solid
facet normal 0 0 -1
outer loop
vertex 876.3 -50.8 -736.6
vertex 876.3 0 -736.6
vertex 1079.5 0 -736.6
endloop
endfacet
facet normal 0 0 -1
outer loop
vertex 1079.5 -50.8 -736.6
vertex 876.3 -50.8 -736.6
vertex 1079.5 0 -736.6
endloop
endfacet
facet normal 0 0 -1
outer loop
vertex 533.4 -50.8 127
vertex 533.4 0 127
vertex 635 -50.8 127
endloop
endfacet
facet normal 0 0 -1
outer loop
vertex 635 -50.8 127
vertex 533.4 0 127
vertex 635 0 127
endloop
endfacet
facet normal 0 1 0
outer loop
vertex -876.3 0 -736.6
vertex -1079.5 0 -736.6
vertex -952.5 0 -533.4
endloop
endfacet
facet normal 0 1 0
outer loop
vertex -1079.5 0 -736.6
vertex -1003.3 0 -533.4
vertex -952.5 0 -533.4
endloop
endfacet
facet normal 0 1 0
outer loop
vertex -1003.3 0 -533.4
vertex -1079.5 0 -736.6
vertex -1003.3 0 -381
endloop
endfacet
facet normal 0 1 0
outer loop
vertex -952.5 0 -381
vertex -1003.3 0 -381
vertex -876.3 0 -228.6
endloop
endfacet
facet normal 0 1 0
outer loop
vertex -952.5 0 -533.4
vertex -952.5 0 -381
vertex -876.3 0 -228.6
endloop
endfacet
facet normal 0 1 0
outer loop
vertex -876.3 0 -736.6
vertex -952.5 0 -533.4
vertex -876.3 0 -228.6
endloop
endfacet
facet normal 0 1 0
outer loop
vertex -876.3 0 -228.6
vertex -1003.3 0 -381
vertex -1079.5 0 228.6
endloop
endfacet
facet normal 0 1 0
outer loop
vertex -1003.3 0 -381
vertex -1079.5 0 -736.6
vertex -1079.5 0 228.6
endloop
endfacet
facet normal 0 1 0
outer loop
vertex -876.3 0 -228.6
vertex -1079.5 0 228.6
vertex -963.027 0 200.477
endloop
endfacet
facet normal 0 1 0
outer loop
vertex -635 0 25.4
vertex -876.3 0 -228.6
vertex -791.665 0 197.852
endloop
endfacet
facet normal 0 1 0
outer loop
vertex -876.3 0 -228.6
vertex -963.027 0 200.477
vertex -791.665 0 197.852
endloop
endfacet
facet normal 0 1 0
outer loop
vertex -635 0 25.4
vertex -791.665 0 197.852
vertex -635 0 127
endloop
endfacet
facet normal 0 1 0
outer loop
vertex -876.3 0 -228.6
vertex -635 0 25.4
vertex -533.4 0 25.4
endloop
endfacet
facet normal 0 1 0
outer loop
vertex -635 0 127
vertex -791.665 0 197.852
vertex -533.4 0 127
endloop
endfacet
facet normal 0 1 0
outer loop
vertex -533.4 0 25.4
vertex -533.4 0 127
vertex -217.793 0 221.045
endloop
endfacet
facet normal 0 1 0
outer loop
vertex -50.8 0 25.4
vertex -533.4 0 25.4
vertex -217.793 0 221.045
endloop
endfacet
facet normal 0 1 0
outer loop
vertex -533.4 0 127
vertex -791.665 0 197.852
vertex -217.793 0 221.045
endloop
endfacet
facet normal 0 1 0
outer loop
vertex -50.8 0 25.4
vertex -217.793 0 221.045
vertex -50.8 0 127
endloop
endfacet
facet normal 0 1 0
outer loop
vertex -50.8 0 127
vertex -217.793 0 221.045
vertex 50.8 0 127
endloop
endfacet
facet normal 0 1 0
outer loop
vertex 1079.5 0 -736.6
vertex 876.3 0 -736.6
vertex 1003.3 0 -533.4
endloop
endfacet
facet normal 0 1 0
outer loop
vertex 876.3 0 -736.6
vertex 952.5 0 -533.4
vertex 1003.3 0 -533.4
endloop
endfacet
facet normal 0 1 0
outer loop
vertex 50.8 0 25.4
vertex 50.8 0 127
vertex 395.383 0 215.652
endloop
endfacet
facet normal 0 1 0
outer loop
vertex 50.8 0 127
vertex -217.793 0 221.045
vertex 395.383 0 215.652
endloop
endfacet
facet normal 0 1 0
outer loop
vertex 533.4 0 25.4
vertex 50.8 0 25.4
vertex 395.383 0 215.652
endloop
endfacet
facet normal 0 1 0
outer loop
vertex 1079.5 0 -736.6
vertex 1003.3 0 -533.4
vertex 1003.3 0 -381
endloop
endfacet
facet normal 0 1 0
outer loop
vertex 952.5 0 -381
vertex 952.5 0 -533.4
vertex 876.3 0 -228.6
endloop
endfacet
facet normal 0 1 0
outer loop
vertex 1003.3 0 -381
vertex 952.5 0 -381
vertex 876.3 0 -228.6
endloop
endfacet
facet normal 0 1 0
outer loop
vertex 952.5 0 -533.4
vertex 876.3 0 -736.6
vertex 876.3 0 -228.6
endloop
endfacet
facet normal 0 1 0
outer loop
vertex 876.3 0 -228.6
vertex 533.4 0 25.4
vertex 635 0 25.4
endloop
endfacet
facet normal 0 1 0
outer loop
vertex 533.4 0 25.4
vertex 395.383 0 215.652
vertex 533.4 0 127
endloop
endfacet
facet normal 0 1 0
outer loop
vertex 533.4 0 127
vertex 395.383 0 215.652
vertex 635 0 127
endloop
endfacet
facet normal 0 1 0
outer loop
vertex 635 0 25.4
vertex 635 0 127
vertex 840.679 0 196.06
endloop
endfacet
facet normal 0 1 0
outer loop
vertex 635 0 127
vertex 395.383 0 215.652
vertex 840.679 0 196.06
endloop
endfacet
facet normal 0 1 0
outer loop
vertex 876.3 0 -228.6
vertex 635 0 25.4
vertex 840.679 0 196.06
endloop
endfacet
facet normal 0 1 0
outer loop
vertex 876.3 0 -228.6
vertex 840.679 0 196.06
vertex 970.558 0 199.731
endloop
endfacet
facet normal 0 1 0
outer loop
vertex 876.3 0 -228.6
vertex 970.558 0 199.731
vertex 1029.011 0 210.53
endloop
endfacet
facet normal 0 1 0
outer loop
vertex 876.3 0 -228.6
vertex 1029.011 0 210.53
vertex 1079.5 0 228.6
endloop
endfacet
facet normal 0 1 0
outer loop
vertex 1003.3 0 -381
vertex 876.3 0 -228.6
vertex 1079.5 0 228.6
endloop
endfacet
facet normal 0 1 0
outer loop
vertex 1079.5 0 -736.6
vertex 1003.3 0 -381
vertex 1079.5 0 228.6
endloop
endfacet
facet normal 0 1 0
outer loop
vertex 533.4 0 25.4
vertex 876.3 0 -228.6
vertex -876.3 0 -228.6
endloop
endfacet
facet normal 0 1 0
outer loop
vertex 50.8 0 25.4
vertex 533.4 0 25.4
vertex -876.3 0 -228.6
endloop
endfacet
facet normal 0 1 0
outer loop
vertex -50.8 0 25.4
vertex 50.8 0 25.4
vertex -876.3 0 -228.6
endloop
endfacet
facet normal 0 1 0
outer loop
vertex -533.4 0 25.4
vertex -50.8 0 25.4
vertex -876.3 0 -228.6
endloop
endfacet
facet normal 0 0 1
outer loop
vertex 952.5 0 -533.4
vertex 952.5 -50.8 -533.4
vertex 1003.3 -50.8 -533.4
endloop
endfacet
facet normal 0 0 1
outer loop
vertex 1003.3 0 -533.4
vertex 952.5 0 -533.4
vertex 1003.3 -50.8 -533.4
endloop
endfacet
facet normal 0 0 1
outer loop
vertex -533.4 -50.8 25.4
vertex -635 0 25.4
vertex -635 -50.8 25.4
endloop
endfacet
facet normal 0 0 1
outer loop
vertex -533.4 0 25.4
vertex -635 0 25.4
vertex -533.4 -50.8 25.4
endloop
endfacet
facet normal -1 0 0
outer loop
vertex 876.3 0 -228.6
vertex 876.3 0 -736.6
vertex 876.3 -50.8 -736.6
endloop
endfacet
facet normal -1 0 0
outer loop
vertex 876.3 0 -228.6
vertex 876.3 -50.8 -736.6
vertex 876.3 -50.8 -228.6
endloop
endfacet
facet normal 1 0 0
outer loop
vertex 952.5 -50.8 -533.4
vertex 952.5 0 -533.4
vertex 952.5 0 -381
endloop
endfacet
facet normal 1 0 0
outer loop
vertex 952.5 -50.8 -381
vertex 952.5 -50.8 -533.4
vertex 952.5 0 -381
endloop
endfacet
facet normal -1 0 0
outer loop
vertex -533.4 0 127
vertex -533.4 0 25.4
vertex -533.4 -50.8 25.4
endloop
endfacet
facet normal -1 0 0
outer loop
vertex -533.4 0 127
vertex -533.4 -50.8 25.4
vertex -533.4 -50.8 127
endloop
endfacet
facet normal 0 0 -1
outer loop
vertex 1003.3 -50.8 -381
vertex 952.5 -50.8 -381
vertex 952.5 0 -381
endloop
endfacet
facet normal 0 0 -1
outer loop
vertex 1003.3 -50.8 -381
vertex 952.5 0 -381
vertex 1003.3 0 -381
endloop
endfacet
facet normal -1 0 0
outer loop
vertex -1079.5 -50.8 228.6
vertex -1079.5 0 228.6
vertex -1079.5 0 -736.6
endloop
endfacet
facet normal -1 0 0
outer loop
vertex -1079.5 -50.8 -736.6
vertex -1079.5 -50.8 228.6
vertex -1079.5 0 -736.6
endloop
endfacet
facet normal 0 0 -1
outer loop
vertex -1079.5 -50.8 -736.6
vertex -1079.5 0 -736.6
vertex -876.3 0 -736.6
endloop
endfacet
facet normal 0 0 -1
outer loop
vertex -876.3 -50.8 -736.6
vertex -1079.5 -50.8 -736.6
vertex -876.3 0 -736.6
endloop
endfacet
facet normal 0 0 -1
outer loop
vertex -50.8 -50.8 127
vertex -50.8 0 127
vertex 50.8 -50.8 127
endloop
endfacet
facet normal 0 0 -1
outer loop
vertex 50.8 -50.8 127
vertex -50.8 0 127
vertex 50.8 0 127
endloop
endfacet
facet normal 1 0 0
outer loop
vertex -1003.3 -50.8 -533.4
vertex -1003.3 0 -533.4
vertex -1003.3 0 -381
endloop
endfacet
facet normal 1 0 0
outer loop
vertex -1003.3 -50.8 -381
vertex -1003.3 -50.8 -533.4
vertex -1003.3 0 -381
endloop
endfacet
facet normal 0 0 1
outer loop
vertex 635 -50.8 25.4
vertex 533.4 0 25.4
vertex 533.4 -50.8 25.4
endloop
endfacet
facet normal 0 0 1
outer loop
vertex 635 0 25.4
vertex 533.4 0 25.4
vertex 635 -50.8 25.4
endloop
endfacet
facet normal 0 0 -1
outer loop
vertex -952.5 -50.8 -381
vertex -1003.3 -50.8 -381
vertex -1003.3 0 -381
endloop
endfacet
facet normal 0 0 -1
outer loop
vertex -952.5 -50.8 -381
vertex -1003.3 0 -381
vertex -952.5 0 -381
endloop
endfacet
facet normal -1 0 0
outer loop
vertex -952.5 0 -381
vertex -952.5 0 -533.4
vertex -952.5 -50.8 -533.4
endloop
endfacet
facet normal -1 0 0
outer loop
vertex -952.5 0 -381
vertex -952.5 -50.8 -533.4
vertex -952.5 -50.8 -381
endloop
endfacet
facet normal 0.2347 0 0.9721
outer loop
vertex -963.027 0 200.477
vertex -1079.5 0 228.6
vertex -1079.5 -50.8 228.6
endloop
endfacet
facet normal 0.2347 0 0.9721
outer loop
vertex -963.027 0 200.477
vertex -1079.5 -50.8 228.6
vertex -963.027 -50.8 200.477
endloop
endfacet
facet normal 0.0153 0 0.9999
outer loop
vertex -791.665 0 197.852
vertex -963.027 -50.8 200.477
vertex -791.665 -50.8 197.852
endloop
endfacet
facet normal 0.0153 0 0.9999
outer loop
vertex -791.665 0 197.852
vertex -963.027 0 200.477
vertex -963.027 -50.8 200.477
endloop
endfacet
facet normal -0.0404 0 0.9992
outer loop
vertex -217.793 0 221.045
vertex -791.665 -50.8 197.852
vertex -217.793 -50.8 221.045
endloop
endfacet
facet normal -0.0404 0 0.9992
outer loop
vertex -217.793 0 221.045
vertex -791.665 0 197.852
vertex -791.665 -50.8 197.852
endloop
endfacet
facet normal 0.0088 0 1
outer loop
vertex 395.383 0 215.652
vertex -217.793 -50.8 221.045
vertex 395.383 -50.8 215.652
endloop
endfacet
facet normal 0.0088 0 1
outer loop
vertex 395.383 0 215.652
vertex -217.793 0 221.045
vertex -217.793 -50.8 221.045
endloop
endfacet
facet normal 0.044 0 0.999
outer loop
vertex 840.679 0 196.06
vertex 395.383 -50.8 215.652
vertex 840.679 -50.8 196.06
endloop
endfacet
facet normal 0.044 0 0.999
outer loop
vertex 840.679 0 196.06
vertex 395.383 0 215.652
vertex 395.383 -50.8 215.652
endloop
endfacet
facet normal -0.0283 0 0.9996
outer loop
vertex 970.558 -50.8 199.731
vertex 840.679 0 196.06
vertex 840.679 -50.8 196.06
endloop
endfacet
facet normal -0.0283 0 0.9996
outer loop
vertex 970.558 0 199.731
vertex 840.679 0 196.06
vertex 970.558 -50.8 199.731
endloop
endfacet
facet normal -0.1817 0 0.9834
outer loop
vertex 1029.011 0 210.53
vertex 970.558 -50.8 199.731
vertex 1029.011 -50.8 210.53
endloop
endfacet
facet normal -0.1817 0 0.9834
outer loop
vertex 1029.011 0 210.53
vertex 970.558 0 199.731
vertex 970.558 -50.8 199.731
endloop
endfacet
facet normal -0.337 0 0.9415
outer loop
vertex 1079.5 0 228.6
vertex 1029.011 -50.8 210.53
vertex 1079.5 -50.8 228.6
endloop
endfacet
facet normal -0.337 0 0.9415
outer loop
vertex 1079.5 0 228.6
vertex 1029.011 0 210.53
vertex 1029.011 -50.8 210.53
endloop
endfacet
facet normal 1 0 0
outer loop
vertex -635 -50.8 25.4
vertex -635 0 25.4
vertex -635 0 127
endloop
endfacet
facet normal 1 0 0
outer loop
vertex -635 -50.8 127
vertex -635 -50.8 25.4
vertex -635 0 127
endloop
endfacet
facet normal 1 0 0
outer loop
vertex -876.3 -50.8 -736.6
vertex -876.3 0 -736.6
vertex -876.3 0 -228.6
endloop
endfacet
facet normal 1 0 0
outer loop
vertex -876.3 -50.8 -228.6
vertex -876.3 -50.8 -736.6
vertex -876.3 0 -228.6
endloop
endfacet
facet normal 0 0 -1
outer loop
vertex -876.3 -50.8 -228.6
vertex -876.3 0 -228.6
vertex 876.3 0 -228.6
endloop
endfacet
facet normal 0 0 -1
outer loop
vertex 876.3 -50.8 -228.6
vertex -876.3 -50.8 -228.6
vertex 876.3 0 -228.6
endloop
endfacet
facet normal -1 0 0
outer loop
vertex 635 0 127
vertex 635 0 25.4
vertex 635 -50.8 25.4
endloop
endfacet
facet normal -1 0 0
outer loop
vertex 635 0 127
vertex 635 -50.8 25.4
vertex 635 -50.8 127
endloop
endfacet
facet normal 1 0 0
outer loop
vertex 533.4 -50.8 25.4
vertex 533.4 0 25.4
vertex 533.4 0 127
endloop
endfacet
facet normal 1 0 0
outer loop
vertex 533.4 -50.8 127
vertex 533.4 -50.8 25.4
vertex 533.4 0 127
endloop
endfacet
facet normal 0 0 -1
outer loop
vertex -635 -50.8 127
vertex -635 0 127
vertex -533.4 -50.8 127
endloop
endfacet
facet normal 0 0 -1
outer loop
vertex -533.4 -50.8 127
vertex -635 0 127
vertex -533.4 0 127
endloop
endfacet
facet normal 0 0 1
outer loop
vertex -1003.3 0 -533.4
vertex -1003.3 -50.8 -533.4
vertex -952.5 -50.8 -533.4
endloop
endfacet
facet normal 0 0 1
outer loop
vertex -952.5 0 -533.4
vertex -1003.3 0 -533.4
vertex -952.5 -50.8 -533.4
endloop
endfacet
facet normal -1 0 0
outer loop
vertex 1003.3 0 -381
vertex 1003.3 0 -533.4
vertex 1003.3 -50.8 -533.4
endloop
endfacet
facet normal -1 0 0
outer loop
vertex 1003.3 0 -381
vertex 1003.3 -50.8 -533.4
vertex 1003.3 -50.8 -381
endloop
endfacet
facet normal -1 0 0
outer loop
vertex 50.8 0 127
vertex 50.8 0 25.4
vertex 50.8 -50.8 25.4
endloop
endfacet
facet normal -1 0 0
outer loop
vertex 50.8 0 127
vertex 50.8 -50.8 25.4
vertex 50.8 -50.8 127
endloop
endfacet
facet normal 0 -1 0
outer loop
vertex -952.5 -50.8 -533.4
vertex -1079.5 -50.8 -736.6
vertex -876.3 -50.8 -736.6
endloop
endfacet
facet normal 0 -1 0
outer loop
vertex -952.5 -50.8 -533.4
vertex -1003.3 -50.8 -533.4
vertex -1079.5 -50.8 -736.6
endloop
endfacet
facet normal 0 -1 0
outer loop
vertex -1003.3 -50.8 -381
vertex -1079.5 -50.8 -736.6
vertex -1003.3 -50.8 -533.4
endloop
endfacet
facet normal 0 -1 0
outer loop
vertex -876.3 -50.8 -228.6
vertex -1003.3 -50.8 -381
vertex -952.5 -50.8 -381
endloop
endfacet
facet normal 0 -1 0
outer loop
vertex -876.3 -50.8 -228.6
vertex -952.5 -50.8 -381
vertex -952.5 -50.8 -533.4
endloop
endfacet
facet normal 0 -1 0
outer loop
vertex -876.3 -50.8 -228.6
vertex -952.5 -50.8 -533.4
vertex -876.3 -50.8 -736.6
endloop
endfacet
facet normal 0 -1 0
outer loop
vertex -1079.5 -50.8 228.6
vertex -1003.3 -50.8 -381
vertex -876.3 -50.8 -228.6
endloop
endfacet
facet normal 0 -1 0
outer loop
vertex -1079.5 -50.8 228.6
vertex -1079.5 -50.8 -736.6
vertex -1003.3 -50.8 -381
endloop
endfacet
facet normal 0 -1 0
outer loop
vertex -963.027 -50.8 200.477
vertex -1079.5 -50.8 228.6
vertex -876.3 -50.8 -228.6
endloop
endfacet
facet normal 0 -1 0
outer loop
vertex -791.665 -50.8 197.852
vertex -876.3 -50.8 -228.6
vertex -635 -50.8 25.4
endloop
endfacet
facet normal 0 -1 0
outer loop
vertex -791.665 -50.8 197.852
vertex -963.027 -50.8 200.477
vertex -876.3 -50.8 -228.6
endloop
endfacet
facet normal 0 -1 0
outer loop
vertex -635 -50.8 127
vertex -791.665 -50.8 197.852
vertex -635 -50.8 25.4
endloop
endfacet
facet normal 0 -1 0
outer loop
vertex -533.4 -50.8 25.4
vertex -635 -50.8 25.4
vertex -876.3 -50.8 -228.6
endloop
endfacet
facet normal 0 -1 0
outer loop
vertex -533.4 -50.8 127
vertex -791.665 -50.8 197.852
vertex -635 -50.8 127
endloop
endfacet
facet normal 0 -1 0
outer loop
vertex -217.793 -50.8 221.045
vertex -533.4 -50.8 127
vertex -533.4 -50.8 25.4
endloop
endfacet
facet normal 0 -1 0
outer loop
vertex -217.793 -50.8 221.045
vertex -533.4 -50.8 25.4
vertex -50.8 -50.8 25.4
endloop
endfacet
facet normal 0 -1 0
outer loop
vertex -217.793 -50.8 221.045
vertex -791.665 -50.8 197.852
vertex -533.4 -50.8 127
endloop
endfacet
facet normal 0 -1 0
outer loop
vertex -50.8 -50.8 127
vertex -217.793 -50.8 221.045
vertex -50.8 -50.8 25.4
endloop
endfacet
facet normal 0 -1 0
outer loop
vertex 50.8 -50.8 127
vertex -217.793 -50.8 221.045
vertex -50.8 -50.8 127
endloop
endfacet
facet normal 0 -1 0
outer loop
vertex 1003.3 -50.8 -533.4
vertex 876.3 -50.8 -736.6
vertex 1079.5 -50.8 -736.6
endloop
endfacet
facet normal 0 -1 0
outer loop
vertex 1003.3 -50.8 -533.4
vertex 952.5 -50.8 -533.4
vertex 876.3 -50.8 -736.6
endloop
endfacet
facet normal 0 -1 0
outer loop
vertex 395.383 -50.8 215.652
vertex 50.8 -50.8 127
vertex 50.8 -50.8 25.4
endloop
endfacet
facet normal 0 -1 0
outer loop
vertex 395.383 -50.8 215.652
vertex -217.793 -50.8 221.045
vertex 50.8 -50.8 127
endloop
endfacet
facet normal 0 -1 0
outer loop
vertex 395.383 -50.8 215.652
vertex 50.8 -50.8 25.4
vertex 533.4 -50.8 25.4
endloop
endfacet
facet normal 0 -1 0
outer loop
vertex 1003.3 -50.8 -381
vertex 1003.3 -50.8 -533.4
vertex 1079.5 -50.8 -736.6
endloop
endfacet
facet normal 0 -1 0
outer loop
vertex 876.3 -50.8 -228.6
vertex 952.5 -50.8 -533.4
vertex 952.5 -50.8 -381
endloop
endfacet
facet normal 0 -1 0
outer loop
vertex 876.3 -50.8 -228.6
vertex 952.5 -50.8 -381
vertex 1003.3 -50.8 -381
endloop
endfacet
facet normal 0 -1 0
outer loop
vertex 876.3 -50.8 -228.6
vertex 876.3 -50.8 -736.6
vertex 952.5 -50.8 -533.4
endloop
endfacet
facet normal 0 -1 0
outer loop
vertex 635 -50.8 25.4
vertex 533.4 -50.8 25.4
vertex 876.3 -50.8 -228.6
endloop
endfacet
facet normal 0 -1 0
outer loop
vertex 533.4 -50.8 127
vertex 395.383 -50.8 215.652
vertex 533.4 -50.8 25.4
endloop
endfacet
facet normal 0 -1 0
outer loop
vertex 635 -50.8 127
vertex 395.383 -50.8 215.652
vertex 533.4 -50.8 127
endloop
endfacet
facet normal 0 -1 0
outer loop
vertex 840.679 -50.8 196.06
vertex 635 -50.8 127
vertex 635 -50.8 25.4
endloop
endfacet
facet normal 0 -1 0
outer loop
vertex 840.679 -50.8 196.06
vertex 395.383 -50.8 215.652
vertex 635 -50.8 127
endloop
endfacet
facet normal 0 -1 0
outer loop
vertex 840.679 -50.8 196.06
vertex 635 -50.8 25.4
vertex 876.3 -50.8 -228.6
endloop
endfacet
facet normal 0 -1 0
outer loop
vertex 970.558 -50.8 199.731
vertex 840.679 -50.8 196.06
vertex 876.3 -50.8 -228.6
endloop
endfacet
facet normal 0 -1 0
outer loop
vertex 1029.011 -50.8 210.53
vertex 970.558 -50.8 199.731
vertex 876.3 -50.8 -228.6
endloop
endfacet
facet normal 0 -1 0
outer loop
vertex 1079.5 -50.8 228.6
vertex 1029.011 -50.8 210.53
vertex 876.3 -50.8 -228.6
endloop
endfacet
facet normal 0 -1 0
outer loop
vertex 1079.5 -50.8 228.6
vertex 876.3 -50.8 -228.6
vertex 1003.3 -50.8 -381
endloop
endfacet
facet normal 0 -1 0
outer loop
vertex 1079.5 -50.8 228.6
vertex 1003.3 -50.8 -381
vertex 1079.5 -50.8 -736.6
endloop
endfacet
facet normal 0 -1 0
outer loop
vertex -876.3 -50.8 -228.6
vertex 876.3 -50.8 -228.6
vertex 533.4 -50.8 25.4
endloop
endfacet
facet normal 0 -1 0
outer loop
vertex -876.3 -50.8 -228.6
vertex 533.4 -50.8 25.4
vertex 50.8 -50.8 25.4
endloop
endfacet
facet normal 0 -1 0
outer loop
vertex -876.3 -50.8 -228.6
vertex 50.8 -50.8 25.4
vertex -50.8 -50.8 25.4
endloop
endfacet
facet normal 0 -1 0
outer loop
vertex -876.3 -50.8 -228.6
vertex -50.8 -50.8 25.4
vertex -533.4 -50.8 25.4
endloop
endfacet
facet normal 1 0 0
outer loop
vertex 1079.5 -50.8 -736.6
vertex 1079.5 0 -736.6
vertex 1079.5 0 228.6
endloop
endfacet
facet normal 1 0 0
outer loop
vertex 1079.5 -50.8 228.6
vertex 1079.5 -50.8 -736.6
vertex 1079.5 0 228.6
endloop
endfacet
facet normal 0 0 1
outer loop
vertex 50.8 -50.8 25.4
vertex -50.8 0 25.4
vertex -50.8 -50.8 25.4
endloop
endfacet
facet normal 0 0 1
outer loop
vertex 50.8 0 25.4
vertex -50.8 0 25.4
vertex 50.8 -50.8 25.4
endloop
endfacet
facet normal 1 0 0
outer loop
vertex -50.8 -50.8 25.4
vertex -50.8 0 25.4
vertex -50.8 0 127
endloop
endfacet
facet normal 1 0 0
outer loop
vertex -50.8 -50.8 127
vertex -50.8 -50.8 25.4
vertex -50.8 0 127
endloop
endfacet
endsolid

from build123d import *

# Parameters (mm, degrees)
F0_W     = 203.2
F0_H     = 508
F0_W_2   = 50.8
F0_H_2   = 152.4
F0_W_3   = 101.6
F0_H_3   = 101.6
F1_DEPTH = 50.8


with BuildPart() as f1:
    # F0 (on Front) → F1 (new body)
    with BuildSketch(Plane.XZ):
        with Locations((-977.9, -482.6)):
            Rectangle(F0_W, F0_H)
        with Locations((-977.9, -457.2)):
            Rectangle(F0_W_2, F0_H_2, mode=Mode.SUBTRACT)
        with Locations((977.9, -482.6)):
            Rectangle(F0_W, F0_H)
        with Locations((977.9, -457.2)):
            Rectangle(F0_W_2, F0_H_2, mode=Mode.SUBTRACT)
        with BuildLine():
            add(Edge.make_bspline(
                [(-1079.5, 228.6), (-968.1757741692, 184.2889311875), (-678.4073473646, 207.95738785), (-90.2517712986, 229.8963509513), (677.7555694837, 210.4033216408), (982.5995632946, 183.4544273595), (1079.5, 228.6)],
                knots=[0, 0, 0, 0, 0.2127647976, 0.4816607486, 0.7872352024, 1, 1, 1, 1], degree=3))
            Line((-1079.5, 228.6), (-1079.5, -228.6))
            Line((-1079.5, -228.6), (-876.3, -228.6))
            Line((-876.3, -228.6), (876.3, -228.6))
            Line((876.3, -228.6), (1079.5, -228.6))
            Line((1079.5, -228.6), (1079.5, 228.6))
        make_face()
        with Locations((-584.2, 76.2)):
            Rectangle(F0_W_3, F0_H_3, mode=Mode.SUBTRACT)
        with Locations((0, 76.2)):
            Rectangle(F0_W_3, F0_H_3, mode=Mode.SUBTRACT)
        with Locations((584.2, 76.2)):
            Rectangle(F0_W_3, F0_H_3, mode=Mode.SUBTRACT)
    extrude(amount=F1_DEPTH)


solid = f1.part
